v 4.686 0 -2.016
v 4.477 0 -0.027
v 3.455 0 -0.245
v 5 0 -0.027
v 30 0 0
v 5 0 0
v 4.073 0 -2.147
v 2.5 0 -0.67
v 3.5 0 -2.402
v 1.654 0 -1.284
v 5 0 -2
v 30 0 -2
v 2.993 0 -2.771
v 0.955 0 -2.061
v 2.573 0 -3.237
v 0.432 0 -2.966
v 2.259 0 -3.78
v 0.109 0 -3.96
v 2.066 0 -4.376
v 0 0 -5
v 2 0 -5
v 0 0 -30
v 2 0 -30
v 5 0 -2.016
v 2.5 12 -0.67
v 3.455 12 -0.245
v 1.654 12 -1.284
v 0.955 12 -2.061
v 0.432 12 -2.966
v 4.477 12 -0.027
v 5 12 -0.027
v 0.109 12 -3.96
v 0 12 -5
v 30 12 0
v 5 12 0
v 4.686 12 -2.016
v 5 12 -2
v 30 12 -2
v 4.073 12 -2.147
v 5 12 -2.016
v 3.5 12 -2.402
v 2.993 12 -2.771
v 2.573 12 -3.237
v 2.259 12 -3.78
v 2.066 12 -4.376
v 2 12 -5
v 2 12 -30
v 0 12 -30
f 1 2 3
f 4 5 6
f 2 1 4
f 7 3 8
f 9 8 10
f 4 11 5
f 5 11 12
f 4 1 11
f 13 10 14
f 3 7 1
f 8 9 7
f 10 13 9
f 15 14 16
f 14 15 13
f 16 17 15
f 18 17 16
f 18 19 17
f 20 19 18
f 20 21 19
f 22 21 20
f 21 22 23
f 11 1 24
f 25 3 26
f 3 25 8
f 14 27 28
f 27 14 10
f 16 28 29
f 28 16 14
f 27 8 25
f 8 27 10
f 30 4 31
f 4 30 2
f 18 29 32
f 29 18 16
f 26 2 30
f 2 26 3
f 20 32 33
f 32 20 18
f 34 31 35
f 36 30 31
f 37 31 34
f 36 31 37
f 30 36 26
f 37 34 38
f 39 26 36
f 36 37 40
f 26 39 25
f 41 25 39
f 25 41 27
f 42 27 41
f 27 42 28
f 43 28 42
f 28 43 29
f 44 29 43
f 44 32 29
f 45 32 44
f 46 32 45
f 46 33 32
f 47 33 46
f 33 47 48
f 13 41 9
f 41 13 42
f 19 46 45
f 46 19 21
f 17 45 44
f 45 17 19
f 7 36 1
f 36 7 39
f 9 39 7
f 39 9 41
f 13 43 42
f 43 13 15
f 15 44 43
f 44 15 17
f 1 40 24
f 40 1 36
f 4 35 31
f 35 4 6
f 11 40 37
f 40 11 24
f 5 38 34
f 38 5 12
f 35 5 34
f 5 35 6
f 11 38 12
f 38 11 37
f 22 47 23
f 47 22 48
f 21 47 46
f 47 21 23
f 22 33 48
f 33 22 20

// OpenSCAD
// hoekbeschermer voor hout zodat je hoofd niet zo zeer doet als je je stoot
// Ik ga uit van lange schrroven die meteen zorgen voor het
// bevestigen van het hout
//


b = 40;
h = 60;
wall = 1;

metal();

module metalCorner() {
    difference() {
        metal();
        holes();
    }
}

module metal() {
    l = 30;
    b = 12;
    h = 2;
    r = 5;
    
    c = [l - r, b, h];
    translate([r, 0, -r]) {
        corner(r, b, h);
        translate([0, 0, r - h])
            cube(c);
        translate([-r, 0, 0])
            rotate([0, 90, 0])
                cube(c);
    }
}

module corner(r, b, wall) {
    l = max(r,b);
    translate([0, b/2, 0])
    rotate([90, 0, 0])
    difference() {
        cylinder(r = r, h = b, $fn = 30, center = true);
        cylinder(r = r - wall, h = b * 2, $fn = 30, center = true);
        translate([0, -l , -l /2])
            cube([l, l * 2, l] * 1.1);
        translate([-l, -l , -l /2])
            cube([l * 1.1, l , l]);
    }

}

module holes() {
    
}
